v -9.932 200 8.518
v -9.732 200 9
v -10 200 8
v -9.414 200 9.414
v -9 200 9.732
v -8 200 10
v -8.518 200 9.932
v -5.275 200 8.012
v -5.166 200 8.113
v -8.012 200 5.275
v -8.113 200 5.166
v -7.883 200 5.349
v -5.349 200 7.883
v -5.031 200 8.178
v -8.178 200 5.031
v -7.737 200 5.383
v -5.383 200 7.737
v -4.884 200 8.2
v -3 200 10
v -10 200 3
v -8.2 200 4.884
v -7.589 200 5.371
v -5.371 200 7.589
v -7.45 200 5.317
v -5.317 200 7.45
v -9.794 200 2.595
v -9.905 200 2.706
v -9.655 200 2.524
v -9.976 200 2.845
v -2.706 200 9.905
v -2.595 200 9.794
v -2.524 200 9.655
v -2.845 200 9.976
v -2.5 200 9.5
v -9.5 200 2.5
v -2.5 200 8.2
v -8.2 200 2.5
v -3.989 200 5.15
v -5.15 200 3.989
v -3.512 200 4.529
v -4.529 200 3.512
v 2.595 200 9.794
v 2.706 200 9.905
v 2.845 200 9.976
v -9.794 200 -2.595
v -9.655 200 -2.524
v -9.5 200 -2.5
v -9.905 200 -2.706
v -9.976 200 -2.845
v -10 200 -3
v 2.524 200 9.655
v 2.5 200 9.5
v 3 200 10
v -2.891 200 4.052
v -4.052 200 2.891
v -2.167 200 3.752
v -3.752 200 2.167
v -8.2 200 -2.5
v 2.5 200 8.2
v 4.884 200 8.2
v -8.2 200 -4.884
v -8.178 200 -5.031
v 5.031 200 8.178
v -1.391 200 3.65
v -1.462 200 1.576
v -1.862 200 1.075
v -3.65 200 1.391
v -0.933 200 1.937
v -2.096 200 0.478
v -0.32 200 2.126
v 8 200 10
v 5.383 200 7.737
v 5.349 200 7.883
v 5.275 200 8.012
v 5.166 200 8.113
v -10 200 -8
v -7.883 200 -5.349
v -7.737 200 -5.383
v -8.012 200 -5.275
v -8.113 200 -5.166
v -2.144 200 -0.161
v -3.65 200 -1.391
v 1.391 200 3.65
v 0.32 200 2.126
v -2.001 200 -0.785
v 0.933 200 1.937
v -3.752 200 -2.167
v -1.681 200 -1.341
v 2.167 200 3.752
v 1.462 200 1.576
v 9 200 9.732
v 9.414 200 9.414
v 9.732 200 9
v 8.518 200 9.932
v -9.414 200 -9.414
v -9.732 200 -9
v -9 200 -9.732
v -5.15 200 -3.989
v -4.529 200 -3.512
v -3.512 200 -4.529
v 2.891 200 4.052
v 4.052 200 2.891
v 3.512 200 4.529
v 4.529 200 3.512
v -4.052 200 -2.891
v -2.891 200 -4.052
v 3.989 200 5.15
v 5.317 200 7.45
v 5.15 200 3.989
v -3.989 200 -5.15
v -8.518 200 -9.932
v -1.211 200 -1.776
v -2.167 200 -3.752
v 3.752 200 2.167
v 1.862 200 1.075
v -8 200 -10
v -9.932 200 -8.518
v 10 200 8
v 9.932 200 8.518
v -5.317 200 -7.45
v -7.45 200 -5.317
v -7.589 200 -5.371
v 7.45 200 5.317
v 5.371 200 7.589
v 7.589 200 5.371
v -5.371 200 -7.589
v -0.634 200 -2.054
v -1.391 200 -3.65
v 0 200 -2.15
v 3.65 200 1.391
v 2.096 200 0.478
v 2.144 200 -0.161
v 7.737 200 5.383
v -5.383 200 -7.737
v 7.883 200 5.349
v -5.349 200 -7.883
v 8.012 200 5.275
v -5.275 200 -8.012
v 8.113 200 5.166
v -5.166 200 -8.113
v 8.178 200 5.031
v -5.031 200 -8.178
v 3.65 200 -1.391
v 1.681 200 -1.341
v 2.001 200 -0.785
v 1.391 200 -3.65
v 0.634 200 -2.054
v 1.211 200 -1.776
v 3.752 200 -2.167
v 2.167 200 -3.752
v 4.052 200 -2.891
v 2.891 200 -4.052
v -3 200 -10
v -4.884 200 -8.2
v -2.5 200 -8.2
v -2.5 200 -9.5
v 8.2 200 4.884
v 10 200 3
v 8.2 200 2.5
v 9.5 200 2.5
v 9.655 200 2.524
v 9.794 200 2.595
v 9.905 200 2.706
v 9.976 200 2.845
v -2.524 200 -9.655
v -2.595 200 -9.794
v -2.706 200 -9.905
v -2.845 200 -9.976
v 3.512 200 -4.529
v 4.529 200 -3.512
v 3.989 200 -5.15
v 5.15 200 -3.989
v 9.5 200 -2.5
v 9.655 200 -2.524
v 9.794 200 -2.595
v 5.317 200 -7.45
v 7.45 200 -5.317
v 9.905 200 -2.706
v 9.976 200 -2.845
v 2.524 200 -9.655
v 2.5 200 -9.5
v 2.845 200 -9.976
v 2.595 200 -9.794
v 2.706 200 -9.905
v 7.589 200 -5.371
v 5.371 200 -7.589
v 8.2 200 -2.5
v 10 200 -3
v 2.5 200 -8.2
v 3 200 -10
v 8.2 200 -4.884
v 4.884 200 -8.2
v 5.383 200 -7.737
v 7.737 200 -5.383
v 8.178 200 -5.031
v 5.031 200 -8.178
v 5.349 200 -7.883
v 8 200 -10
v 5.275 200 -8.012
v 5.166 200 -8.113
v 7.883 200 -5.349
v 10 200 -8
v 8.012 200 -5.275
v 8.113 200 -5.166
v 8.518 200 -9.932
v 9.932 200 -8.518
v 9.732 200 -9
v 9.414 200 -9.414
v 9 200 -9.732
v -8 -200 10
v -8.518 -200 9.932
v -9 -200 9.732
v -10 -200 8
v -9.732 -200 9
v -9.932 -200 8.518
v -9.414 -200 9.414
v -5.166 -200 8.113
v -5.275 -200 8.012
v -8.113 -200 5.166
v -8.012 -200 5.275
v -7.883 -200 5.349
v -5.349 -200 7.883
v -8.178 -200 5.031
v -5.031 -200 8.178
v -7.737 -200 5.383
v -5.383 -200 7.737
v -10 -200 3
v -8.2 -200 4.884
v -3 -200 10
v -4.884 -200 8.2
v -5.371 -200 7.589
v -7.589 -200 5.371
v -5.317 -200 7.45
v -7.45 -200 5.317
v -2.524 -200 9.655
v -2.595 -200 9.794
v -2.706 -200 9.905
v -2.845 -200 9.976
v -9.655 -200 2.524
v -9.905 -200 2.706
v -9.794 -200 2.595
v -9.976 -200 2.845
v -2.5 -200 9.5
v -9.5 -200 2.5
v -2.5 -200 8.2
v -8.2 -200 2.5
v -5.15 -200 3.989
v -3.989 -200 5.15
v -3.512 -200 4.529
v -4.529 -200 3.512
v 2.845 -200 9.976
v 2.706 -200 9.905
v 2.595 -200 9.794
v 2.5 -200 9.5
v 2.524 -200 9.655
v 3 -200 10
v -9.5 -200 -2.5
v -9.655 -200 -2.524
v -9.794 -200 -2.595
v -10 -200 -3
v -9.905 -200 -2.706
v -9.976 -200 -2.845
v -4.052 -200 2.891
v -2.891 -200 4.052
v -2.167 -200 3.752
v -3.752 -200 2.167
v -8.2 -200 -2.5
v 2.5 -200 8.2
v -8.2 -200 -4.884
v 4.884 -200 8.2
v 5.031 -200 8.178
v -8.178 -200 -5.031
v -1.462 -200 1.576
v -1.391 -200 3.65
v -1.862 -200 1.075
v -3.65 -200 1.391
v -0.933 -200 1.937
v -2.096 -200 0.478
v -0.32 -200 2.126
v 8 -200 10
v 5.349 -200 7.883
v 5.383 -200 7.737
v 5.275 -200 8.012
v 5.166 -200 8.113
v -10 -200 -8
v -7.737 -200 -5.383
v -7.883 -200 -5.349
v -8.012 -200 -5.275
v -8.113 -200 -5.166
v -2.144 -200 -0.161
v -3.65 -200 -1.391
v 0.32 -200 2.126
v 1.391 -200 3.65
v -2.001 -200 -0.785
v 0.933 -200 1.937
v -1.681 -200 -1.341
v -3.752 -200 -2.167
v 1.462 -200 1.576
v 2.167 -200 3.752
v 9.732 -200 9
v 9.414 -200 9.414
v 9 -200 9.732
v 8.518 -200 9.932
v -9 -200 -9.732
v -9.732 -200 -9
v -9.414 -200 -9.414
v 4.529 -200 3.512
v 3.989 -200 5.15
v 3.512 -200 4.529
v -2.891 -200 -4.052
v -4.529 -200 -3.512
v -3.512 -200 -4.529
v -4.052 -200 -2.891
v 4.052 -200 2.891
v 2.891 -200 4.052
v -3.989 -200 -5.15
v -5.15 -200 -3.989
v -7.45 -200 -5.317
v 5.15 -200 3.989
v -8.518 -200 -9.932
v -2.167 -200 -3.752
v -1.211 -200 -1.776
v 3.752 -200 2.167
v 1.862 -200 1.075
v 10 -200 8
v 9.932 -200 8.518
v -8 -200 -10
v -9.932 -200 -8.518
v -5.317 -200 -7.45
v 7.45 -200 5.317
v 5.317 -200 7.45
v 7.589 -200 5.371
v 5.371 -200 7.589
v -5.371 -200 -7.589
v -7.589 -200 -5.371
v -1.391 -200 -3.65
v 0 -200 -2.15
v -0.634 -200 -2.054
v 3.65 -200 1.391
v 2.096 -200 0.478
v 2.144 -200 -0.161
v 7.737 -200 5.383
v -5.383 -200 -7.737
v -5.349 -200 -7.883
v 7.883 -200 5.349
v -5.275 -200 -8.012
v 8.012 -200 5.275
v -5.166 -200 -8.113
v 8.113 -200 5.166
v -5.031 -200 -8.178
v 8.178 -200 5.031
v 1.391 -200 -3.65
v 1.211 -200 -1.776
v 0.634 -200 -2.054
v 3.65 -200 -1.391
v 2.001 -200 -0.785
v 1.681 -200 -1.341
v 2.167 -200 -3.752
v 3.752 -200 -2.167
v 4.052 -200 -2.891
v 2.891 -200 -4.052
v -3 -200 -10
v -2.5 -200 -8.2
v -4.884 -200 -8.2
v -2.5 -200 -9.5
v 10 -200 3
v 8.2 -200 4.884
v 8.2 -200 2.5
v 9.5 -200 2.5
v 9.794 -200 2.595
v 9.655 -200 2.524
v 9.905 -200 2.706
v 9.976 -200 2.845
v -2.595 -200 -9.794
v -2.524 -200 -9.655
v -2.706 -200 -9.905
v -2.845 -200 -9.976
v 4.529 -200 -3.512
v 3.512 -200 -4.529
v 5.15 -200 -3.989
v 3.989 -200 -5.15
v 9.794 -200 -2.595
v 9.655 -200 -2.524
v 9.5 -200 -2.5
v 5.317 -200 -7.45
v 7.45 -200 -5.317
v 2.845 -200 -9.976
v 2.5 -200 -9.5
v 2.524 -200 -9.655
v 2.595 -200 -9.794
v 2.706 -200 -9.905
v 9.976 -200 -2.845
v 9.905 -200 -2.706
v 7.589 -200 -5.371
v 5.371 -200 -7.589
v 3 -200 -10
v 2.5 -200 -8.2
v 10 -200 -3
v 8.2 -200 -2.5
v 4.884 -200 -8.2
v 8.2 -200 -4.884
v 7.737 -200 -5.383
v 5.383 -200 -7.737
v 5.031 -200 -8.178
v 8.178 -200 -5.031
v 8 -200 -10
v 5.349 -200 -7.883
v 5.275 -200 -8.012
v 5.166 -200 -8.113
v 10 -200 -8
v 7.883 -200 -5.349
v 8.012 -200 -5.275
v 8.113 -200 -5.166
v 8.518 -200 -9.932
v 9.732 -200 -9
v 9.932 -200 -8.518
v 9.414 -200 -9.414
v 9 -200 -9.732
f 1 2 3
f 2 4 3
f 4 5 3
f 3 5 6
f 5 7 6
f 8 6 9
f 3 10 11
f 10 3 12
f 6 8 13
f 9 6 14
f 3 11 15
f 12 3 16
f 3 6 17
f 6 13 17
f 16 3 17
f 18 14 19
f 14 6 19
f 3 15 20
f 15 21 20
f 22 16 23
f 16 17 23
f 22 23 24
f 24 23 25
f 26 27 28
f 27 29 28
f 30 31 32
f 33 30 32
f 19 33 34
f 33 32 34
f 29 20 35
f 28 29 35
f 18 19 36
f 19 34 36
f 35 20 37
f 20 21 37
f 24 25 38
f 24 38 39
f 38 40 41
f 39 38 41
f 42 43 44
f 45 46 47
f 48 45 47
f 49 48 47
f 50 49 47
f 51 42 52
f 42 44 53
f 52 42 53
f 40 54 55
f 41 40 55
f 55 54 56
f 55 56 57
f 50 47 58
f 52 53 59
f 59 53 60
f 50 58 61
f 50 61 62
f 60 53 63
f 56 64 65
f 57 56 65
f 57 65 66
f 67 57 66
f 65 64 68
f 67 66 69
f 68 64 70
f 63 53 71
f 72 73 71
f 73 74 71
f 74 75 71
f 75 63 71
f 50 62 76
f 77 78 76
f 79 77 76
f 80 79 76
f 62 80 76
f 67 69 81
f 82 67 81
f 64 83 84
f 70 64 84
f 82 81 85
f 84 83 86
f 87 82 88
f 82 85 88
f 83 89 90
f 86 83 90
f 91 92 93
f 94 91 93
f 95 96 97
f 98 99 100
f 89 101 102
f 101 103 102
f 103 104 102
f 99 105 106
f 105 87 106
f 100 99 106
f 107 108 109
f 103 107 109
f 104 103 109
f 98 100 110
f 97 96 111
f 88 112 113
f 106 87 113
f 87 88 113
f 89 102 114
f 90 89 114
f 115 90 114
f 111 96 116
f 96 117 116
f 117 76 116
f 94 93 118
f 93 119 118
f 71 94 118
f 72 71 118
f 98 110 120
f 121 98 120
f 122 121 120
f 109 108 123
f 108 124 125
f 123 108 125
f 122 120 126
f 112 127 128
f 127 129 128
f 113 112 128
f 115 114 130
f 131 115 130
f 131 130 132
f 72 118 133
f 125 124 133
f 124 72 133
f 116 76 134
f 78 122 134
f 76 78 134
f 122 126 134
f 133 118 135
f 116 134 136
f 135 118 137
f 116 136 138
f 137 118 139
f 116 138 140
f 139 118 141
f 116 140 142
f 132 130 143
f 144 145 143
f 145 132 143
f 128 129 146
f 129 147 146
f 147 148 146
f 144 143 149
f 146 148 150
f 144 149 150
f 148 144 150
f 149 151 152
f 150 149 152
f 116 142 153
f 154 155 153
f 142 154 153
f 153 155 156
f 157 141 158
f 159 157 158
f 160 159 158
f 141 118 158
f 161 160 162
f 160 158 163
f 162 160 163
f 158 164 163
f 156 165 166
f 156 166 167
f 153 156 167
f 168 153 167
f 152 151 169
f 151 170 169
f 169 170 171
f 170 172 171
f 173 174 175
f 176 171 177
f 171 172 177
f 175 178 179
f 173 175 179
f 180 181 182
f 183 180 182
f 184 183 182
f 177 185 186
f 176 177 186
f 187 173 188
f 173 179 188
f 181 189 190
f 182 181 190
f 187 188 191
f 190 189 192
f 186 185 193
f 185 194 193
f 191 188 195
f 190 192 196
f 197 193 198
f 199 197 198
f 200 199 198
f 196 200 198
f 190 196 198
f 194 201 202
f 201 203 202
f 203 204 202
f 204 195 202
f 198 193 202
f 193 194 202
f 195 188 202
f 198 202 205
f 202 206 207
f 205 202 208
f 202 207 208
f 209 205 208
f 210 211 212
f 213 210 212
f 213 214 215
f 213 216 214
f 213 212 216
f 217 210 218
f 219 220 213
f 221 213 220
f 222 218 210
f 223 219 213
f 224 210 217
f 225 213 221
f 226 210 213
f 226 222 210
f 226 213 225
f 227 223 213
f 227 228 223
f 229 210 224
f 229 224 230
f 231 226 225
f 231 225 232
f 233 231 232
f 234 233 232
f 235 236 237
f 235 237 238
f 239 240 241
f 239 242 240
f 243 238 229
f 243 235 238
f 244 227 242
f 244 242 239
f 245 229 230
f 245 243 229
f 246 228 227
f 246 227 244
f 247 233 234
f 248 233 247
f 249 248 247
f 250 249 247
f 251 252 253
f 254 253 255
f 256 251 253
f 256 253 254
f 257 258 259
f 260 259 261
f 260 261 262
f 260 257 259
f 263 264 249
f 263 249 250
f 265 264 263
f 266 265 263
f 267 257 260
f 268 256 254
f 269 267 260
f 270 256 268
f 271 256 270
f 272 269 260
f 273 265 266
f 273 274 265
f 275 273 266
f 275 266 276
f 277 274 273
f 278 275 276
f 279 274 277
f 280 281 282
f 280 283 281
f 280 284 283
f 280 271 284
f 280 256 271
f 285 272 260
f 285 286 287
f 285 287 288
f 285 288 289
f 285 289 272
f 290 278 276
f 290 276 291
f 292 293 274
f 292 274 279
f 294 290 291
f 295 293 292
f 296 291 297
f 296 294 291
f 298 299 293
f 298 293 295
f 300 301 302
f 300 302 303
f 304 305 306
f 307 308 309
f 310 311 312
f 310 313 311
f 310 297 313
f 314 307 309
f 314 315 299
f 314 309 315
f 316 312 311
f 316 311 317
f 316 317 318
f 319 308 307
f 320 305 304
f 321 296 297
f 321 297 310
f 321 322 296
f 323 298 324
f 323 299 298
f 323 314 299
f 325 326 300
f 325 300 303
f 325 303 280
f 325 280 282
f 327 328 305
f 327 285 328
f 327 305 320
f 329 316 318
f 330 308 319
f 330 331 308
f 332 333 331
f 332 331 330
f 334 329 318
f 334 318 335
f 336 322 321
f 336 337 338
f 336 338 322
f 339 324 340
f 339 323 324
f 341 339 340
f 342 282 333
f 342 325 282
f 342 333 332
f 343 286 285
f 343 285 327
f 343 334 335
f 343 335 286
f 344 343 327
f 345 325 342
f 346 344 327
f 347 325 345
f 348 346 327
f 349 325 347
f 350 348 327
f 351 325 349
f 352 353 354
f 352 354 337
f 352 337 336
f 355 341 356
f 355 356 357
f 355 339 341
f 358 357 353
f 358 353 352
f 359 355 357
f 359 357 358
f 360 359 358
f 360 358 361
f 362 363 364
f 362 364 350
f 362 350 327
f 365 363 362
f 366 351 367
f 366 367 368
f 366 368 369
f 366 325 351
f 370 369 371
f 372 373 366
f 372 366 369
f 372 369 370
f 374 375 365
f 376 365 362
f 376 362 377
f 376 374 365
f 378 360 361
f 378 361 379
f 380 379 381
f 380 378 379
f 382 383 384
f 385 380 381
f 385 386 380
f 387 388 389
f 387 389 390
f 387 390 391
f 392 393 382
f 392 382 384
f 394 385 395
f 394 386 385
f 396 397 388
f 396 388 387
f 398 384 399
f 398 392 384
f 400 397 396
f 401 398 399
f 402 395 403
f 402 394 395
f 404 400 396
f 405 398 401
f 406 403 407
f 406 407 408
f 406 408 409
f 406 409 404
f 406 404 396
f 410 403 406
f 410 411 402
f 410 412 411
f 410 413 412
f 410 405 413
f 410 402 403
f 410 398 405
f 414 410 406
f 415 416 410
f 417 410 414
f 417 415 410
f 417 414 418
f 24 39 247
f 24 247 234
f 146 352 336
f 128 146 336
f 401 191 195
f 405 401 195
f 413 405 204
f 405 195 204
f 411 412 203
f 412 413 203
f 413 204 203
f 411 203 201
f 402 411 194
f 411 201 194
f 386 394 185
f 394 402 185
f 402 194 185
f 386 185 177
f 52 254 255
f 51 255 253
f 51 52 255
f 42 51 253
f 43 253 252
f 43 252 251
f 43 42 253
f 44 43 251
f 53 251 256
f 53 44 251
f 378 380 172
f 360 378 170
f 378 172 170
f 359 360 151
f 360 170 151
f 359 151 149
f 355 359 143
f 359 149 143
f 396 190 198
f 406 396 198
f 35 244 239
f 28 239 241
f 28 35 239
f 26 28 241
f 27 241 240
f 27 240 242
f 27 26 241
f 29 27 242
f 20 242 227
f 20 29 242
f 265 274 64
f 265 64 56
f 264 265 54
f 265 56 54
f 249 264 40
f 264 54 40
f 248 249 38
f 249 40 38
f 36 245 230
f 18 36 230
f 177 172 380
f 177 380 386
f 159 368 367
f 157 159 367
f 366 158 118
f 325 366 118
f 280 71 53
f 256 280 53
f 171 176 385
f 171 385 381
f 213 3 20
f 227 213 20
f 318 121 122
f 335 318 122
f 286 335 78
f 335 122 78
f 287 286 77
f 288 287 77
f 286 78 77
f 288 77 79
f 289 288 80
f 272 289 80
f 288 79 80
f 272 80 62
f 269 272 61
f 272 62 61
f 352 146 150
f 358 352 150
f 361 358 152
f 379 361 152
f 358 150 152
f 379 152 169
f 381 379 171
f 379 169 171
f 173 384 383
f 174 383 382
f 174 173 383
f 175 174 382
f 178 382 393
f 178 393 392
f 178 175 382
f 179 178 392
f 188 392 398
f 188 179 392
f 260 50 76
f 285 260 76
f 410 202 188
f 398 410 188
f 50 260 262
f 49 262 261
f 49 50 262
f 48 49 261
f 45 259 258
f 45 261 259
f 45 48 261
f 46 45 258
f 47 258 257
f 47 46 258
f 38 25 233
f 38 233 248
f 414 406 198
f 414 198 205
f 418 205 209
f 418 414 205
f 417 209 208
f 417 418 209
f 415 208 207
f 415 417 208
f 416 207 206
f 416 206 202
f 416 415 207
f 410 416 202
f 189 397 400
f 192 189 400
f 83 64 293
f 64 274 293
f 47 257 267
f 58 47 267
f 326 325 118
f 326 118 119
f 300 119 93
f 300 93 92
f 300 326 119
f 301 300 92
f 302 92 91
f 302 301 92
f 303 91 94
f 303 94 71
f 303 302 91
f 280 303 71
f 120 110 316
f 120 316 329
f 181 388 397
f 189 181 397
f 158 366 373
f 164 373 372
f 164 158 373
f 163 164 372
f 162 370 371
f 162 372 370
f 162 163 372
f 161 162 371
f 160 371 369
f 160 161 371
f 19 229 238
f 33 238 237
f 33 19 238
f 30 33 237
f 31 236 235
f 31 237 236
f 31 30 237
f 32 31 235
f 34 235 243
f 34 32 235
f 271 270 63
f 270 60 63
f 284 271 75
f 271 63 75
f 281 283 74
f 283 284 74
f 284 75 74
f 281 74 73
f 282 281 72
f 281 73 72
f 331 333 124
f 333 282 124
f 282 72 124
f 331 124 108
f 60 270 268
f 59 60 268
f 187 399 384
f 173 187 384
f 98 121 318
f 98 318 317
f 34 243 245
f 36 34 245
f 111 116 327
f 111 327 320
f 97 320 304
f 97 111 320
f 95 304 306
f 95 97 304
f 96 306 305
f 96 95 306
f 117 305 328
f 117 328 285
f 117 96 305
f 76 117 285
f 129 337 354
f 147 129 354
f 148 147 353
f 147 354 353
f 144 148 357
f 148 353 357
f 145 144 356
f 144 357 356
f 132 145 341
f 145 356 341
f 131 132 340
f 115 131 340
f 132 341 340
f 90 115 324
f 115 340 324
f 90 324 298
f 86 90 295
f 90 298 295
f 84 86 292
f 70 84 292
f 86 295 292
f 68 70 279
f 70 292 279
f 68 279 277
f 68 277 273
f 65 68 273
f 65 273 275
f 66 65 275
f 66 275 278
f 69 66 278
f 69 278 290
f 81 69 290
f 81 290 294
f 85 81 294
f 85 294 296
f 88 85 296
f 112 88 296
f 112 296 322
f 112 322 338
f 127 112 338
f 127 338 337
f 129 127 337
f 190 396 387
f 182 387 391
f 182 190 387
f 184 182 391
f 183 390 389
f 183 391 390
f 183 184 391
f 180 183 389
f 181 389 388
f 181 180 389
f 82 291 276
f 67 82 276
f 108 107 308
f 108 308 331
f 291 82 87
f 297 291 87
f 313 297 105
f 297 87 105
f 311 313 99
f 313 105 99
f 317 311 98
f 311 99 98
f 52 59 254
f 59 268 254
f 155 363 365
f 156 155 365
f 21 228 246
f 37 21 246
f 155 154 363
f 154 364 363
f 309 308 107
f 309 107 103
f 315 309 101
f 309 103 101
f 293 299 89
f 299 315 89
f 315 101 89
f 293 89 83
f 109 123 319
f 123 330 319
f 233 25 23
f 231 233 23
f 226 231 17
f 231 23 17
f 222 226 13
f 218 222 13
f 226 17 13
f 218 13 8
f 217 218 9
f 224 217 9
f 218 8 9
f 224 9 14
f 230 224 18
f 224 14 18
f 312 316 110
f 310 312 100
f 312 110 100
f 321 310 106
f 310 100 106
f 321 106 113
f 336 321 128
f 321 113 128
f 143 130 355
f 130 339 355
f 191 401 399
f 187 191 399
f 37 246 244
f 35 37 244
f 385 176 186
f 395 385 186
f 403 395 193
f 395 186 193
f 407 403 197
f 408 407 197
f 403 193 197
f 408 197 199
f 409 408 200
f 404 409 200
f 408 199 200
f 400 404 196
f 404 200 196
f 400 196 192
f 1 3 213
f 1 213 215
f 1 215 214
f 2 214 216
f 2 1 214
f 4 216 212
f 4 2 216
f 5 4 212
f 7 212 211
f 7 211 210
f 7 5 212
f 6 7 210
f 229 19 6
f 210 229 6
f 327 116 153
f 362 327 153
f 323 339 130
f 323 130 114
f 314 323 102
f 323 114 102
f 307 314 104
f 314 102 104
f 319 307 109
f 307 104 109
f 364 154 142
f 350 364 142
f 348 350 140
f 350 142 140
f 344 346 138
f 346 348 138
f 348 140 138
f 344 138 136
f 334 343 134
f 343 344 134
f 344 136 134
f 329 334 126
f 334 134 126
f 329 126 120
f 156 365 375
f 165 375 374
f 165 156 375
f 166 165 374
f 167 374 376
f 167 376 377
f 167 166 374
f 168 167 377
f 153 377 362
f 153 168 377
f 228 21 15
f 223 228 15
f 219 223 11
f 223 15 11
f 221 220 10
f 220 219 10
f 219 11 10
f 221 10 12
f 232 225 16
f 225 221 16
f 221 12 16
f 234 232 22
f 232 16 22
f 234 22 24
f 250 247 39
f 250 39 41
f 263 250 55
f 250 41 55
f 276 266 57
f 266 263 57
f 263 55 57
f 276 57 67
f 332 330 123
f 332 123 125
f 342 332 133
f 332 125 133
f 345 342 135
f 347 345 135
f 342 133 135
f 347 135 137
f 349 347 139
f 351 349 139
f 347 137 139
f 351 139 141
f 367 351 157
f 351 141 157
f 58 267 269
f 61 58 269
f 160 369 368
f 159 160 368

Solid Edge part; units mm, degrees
sketch "Sketch1" plane through (0, 0, 0) normal (0, -1, 0) x (1, 0, 0)
  line L0 (-10, -10) -> (10, -10)
  line L1 (10, -10) -> (10, 10)
  line L2 (10, 10) -> (-10, 10)
  line L3 (-10, 10) -> (-10, -10)
  dimension "D1" = 20
  dimension "D2" = 20
extrude "Protrusion1" add sketch "Sketch1" along normal mid plane 400
sketch "Sketch2" plane through (0, -200, 0) normal (0, -1, 0) x (1, 0, 0)
  line L0 (-2.5, 10) -> (-2.5, 8.2)
  line L1 (-2.5, 8.2) -> (-5.75, 8.2)
  line L2 (-5.75, 8.2) -> (-3.1231, 3.65)
  line L3 (-3.1231, 3.65) -> (3.1231, 3.65)
  line L4 (3.1231, 3.65) -> (5.75, 8.2)
  line L5 (5.75, 8.2) -> (2.5, 8.2)
  line L6 (2.5, 8.2) -> (2.5, 10)
  line L7 (2.5, 10) -> (-2.5, 10)
  dimension "D1" = 11.5
  dimension "D2" = 1.8
  dimension "D3" = 5
  dimension "D4" = 6.35
extrude "Cutout1" cut sketch "Sketch2" against normal through all
fillet "Verrundung_1" radius 2 4 edges at (10, 0, 10) (-10, 0, 10) (10, 0, -10) (-10, 0, -10)
fillet "Verrundung_2" radius 3 2 edges at (-3.1231, 0, 3.65) (3.1231, 0, 3.65)
fillet "Verrundung_3" radius 0.5 4 edges at (-5.75, 0, 8.2) (5.75, 0, 8.2) (-2.5, 0, 10) (2.5, 0, 10)
hole "Bohrung_1" at (0, -200, 0) direction (0, 1, 0) diameter 4.3 end up to next
pattern_circular "Pattern1" count 4 over 360 about axis through (0, -200, 0) along (0, -1, 0) of "Cutout1"
fillet "Round1" radius 3 2 edges at (-3.65, 0, -3.1231) (-3.65, 0, 3.1231)
fillet "Round2" radius 0.5 4 edges at (-8.2, 0, -5.75) (-8.2, 0, 5.75) (-10, 0, -2.5) (-10, 0, 2.5)
fillet "Round3" radius 3 2 edges at (3.1231, 0, -3.65) (-3.1231, 0, -3.65)
fillet "Round4" radius 0.5 4 edges at (5.75, 0, -8.2) (-5.75, 0, -8.2) (2.5, 0, -10) (-2.5, 0, -10)
fillet "Round5" radius 3 2 edges at (3.65, 0, 3.1231) (3.65, 0, -3.1231)
fillet "Round6" radius 0.5 4 edges at (8.2, 0, 5.75) (8.2, 0, -5.75) (10, 0, 2.5) (10, 0, -2.5)
